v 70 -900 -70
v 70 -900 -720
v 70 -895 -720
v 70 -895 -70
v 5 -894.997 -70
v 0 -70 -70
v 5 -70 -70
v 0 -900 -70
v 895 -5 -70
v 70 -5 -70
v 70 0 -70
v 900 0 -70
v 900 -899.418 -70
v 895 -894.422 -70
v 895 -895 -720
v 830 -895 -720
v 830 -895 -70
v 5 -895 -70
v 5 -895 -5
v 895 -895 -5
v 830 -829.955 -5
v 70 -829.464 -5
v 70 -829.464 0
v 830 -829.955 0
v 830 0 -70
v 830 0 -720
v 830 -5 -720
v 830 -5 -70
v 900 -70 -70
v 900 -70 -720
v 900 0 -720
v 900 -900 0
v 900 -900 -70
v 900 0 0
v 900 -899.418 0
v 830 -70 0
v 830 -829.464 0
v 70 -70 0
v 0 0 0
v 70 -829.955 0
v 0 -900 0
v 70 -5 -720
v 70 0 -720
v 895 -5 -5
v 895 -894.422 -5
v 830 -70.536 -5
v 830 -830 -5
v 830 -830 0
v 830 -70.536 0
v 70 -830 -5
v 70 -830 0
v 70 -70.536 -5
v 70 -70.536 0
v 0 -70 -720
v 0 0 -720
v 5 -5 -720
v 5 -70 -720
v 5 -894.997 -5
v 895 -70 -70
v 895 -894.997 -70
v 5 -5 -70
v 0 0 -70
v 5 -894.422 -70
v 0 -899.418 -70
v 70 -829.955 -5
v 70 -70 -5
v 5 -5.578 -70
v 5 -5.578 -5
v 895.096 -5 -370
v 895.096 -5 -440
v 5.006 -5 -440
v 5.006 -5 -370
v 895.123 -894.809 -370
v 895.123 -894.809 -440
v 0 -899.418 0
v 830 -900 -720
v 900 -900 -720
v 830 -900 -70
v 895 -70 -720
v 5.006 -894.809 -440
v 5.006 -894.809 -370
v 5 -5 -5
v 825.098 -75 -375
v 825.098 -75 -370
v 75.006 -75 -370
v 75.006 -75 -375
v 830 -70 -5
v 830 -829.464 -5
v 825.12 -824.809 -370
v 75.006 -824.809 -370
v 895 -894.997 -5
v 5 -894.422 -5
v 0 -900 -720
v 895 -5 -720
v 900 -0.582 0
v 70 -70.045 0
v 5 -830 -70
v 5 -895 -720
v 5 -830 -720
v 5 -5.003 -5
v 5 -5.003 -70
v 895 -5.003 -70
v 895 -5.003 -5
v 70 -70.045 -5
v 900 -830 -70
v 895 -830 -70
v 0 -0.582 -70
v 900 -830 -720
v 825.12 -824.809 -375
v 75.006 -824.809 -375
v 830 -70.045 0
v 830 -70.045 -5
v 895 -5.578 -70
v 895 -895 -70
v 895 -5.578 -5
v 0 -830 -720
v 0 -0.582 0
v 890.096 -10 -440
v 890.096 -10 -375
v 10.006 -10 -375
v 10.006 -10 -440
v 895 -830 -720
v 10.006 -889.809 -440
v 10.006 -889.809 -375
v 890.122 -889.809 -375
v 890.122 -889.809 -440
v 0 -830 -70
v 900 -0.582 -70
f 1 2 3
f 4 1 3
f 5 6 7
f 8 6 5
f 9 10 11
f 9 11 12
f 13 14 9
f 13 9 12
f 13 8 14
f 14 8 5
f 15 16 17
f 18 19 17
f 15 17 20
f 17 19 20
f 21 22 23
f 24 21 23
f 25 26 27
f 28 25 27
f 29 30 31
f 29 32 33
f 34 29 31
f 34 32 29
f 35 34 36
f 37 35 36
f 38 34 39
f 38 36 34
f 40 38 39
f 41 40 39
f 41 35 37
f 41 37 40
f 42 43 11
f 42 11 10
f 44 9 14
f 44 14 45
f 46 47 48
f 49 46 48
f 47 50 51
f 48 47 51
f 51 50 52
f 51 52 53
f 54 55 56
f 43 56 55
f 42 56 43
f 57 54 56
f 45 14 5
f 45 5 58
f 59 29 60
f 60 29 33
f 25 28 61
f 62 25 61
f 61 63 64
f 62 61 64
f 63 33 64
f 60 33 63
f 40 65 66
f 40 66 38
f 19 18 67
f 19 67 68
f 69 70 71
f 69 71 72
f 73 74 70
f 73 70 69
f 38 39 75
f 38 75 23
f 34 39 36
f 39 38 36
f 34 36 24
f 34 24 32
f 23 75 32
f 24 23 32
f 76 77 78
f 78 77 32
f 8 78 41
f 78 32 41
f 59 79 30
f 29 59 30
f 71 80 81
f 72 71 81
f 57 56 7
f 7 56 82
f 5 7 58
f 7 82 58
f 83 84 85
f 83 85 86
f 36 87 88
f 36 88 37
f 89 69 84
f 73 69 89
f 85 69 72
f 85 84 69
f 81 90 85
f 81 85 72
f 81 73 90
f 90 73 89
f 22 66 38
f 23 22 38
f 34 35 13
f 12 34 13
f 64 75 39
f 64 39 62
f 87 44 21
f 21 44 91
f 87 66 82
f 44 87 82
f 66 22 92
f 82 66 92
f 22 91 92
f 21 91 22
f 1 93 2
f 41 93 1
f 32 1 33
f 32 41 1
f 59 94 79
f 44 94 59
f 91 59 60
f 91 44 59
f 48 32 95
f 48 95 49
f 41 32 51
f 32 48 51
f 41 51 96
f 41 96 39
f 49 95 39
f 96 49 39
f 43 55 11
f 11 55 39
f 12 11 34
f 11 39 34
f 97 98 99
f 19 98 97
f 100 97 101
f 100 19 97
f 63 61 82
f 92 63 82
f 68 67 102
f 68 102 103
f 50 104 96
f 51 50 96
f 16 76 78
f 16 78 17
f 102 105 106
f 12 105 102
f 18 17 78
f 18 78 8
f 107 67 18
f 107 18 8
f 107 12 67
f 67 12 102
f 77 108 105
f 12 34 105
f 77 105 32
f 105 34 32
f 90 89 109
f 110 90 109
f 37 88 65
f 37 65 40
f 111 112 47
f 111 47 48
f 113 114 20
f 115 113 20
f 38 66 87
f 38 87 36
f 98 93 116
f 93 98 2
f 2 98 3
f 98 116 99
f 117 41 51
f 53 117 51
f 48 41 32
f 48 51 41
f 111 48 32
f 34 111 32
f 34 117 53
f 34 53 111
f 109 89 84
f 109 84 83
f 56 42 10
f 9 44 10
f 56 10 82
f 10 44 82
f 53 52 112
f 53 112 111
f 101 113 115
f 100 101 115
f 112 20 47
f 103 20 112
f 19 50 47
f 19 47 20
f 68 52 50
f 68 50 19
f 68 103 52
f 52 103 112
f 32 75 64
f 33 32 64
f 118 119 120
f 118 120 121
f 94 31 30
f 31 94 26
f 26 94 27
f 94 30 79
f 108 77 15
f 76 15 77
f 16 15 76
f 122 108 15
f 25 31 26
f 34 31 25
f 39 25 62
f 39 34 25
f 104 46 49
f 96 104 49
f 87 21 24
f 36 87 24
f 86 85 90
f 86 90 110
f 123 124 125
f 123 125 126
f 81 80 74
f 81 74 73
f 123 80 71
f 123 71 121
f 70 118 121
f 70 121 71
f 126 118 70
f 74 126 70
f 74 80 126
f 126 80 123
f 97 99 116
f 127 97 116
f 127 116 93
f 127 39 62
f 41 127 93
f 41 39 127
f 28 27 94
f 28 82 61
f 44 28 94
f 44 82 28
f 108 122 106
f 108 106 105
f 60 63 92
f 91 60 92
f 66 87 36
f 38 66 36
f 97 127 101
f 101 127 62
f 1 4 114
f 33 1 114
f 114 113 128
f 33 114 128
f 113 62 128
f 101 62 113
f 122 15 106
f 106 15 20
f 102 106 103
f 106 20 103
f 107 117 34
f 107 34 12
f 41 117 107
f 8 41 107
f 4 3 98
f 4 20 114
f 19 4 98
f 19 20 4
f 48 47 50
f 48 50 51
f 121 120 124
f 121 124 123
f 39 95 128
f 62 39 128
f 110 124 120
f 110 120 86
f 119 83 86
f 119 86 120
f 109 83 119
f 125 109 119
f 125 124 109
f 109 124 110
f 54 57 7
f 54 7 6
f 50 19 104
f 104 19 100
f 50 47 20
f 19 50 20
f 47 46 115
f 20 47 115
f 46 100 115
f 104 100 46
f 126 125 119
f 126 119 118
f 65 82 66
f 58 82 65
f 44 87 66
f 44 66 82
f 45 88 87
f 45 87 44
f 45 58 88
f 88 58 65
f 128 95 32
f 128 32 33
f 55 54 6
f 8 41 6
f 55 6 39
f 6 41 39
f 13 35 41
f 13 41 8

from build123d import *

# Parameters (mm, degrees)
F5_DEPTH = 650


with BuildPart() as f3:
    # F3: sweep along a path in F0
    with BuildLine(Plane.XY) as f3_path:
        Line((0, 0), (0, -900))
        Line((0, -900), (900, -899.4184353972))
        Line((900, -899.4184353972), (900, 0))
        Line((900, 0), (0, 0))
    # F2 (on offset) → F3 (sweep)
    with BuildSketch(Plane.XZ.offset(450)):
        Polygon((70, 0), (0, 0), (0, -70), (5, -70), (5, -5), (70, -5), align=None)
    sweep(path=f3_path.line, transition=Transition.RIGHT)

    # F4 (on face) → F5 (join)
    with BuildSketch(Plane(origin=(0, 0, -70), x_dir=(1, 0, 0), z_dir=(0, 0, -1))):
        Polygon((0, 70), (0, 0), (70, 0), (70, 5), (5, 5), (5, 70), align=None)
    extrude(amount=F5_DEPTH)


with BuildPart() as f6_1:
    # F6: instance of F3
    add(f3.part.mirror(Plane.XZ.offset(450)))


with BuildPart() as f8_1:
    # F8: instance of F6_1
    add(f6_1.part.mirror(Plane.YZ.offset(450)))


with BuildPart() as f8_2:
    # F8: instance of F3
    add(f3.part.mirror(Plane.YZ.offset(450)))


with BuildPart() as f12:
    # F12: sweep along a path in F11
    with BuildLine(Plane.XY.offset(-370)) as f12_path:
        Line((450.0871598721, -5.1080398262), (894.9875235558, -5.1080398262))
        Line((894.9875235558, -5.1080398262), (895.0144648552, -894.7012424469))
        Line((895.0144648552, -894.7012424469), (5.1137078553, -894.7012424469))
        Line((5.1137078553, -894.7012424469), (5.1137078553, -5.1080398262))
        Line((5.1137078553, -5.1080398262), (450.0871598721, -5.1080398262))
    # F9 (on offset) → F12 (sweep)
    with BuildSketch(Plane.YZ.offset(450)):
        Polygon((-5, -440), (-5, -370), (-75, -370), (-75, -375), (-10, -375), (-10, -440), align=None)
    sweep(path=f12_path.line, transition=Transition.RIGHT)


solid = Compound([f3.part, f6_1.part, f8_1.part, f8_2.part, f12.part])
